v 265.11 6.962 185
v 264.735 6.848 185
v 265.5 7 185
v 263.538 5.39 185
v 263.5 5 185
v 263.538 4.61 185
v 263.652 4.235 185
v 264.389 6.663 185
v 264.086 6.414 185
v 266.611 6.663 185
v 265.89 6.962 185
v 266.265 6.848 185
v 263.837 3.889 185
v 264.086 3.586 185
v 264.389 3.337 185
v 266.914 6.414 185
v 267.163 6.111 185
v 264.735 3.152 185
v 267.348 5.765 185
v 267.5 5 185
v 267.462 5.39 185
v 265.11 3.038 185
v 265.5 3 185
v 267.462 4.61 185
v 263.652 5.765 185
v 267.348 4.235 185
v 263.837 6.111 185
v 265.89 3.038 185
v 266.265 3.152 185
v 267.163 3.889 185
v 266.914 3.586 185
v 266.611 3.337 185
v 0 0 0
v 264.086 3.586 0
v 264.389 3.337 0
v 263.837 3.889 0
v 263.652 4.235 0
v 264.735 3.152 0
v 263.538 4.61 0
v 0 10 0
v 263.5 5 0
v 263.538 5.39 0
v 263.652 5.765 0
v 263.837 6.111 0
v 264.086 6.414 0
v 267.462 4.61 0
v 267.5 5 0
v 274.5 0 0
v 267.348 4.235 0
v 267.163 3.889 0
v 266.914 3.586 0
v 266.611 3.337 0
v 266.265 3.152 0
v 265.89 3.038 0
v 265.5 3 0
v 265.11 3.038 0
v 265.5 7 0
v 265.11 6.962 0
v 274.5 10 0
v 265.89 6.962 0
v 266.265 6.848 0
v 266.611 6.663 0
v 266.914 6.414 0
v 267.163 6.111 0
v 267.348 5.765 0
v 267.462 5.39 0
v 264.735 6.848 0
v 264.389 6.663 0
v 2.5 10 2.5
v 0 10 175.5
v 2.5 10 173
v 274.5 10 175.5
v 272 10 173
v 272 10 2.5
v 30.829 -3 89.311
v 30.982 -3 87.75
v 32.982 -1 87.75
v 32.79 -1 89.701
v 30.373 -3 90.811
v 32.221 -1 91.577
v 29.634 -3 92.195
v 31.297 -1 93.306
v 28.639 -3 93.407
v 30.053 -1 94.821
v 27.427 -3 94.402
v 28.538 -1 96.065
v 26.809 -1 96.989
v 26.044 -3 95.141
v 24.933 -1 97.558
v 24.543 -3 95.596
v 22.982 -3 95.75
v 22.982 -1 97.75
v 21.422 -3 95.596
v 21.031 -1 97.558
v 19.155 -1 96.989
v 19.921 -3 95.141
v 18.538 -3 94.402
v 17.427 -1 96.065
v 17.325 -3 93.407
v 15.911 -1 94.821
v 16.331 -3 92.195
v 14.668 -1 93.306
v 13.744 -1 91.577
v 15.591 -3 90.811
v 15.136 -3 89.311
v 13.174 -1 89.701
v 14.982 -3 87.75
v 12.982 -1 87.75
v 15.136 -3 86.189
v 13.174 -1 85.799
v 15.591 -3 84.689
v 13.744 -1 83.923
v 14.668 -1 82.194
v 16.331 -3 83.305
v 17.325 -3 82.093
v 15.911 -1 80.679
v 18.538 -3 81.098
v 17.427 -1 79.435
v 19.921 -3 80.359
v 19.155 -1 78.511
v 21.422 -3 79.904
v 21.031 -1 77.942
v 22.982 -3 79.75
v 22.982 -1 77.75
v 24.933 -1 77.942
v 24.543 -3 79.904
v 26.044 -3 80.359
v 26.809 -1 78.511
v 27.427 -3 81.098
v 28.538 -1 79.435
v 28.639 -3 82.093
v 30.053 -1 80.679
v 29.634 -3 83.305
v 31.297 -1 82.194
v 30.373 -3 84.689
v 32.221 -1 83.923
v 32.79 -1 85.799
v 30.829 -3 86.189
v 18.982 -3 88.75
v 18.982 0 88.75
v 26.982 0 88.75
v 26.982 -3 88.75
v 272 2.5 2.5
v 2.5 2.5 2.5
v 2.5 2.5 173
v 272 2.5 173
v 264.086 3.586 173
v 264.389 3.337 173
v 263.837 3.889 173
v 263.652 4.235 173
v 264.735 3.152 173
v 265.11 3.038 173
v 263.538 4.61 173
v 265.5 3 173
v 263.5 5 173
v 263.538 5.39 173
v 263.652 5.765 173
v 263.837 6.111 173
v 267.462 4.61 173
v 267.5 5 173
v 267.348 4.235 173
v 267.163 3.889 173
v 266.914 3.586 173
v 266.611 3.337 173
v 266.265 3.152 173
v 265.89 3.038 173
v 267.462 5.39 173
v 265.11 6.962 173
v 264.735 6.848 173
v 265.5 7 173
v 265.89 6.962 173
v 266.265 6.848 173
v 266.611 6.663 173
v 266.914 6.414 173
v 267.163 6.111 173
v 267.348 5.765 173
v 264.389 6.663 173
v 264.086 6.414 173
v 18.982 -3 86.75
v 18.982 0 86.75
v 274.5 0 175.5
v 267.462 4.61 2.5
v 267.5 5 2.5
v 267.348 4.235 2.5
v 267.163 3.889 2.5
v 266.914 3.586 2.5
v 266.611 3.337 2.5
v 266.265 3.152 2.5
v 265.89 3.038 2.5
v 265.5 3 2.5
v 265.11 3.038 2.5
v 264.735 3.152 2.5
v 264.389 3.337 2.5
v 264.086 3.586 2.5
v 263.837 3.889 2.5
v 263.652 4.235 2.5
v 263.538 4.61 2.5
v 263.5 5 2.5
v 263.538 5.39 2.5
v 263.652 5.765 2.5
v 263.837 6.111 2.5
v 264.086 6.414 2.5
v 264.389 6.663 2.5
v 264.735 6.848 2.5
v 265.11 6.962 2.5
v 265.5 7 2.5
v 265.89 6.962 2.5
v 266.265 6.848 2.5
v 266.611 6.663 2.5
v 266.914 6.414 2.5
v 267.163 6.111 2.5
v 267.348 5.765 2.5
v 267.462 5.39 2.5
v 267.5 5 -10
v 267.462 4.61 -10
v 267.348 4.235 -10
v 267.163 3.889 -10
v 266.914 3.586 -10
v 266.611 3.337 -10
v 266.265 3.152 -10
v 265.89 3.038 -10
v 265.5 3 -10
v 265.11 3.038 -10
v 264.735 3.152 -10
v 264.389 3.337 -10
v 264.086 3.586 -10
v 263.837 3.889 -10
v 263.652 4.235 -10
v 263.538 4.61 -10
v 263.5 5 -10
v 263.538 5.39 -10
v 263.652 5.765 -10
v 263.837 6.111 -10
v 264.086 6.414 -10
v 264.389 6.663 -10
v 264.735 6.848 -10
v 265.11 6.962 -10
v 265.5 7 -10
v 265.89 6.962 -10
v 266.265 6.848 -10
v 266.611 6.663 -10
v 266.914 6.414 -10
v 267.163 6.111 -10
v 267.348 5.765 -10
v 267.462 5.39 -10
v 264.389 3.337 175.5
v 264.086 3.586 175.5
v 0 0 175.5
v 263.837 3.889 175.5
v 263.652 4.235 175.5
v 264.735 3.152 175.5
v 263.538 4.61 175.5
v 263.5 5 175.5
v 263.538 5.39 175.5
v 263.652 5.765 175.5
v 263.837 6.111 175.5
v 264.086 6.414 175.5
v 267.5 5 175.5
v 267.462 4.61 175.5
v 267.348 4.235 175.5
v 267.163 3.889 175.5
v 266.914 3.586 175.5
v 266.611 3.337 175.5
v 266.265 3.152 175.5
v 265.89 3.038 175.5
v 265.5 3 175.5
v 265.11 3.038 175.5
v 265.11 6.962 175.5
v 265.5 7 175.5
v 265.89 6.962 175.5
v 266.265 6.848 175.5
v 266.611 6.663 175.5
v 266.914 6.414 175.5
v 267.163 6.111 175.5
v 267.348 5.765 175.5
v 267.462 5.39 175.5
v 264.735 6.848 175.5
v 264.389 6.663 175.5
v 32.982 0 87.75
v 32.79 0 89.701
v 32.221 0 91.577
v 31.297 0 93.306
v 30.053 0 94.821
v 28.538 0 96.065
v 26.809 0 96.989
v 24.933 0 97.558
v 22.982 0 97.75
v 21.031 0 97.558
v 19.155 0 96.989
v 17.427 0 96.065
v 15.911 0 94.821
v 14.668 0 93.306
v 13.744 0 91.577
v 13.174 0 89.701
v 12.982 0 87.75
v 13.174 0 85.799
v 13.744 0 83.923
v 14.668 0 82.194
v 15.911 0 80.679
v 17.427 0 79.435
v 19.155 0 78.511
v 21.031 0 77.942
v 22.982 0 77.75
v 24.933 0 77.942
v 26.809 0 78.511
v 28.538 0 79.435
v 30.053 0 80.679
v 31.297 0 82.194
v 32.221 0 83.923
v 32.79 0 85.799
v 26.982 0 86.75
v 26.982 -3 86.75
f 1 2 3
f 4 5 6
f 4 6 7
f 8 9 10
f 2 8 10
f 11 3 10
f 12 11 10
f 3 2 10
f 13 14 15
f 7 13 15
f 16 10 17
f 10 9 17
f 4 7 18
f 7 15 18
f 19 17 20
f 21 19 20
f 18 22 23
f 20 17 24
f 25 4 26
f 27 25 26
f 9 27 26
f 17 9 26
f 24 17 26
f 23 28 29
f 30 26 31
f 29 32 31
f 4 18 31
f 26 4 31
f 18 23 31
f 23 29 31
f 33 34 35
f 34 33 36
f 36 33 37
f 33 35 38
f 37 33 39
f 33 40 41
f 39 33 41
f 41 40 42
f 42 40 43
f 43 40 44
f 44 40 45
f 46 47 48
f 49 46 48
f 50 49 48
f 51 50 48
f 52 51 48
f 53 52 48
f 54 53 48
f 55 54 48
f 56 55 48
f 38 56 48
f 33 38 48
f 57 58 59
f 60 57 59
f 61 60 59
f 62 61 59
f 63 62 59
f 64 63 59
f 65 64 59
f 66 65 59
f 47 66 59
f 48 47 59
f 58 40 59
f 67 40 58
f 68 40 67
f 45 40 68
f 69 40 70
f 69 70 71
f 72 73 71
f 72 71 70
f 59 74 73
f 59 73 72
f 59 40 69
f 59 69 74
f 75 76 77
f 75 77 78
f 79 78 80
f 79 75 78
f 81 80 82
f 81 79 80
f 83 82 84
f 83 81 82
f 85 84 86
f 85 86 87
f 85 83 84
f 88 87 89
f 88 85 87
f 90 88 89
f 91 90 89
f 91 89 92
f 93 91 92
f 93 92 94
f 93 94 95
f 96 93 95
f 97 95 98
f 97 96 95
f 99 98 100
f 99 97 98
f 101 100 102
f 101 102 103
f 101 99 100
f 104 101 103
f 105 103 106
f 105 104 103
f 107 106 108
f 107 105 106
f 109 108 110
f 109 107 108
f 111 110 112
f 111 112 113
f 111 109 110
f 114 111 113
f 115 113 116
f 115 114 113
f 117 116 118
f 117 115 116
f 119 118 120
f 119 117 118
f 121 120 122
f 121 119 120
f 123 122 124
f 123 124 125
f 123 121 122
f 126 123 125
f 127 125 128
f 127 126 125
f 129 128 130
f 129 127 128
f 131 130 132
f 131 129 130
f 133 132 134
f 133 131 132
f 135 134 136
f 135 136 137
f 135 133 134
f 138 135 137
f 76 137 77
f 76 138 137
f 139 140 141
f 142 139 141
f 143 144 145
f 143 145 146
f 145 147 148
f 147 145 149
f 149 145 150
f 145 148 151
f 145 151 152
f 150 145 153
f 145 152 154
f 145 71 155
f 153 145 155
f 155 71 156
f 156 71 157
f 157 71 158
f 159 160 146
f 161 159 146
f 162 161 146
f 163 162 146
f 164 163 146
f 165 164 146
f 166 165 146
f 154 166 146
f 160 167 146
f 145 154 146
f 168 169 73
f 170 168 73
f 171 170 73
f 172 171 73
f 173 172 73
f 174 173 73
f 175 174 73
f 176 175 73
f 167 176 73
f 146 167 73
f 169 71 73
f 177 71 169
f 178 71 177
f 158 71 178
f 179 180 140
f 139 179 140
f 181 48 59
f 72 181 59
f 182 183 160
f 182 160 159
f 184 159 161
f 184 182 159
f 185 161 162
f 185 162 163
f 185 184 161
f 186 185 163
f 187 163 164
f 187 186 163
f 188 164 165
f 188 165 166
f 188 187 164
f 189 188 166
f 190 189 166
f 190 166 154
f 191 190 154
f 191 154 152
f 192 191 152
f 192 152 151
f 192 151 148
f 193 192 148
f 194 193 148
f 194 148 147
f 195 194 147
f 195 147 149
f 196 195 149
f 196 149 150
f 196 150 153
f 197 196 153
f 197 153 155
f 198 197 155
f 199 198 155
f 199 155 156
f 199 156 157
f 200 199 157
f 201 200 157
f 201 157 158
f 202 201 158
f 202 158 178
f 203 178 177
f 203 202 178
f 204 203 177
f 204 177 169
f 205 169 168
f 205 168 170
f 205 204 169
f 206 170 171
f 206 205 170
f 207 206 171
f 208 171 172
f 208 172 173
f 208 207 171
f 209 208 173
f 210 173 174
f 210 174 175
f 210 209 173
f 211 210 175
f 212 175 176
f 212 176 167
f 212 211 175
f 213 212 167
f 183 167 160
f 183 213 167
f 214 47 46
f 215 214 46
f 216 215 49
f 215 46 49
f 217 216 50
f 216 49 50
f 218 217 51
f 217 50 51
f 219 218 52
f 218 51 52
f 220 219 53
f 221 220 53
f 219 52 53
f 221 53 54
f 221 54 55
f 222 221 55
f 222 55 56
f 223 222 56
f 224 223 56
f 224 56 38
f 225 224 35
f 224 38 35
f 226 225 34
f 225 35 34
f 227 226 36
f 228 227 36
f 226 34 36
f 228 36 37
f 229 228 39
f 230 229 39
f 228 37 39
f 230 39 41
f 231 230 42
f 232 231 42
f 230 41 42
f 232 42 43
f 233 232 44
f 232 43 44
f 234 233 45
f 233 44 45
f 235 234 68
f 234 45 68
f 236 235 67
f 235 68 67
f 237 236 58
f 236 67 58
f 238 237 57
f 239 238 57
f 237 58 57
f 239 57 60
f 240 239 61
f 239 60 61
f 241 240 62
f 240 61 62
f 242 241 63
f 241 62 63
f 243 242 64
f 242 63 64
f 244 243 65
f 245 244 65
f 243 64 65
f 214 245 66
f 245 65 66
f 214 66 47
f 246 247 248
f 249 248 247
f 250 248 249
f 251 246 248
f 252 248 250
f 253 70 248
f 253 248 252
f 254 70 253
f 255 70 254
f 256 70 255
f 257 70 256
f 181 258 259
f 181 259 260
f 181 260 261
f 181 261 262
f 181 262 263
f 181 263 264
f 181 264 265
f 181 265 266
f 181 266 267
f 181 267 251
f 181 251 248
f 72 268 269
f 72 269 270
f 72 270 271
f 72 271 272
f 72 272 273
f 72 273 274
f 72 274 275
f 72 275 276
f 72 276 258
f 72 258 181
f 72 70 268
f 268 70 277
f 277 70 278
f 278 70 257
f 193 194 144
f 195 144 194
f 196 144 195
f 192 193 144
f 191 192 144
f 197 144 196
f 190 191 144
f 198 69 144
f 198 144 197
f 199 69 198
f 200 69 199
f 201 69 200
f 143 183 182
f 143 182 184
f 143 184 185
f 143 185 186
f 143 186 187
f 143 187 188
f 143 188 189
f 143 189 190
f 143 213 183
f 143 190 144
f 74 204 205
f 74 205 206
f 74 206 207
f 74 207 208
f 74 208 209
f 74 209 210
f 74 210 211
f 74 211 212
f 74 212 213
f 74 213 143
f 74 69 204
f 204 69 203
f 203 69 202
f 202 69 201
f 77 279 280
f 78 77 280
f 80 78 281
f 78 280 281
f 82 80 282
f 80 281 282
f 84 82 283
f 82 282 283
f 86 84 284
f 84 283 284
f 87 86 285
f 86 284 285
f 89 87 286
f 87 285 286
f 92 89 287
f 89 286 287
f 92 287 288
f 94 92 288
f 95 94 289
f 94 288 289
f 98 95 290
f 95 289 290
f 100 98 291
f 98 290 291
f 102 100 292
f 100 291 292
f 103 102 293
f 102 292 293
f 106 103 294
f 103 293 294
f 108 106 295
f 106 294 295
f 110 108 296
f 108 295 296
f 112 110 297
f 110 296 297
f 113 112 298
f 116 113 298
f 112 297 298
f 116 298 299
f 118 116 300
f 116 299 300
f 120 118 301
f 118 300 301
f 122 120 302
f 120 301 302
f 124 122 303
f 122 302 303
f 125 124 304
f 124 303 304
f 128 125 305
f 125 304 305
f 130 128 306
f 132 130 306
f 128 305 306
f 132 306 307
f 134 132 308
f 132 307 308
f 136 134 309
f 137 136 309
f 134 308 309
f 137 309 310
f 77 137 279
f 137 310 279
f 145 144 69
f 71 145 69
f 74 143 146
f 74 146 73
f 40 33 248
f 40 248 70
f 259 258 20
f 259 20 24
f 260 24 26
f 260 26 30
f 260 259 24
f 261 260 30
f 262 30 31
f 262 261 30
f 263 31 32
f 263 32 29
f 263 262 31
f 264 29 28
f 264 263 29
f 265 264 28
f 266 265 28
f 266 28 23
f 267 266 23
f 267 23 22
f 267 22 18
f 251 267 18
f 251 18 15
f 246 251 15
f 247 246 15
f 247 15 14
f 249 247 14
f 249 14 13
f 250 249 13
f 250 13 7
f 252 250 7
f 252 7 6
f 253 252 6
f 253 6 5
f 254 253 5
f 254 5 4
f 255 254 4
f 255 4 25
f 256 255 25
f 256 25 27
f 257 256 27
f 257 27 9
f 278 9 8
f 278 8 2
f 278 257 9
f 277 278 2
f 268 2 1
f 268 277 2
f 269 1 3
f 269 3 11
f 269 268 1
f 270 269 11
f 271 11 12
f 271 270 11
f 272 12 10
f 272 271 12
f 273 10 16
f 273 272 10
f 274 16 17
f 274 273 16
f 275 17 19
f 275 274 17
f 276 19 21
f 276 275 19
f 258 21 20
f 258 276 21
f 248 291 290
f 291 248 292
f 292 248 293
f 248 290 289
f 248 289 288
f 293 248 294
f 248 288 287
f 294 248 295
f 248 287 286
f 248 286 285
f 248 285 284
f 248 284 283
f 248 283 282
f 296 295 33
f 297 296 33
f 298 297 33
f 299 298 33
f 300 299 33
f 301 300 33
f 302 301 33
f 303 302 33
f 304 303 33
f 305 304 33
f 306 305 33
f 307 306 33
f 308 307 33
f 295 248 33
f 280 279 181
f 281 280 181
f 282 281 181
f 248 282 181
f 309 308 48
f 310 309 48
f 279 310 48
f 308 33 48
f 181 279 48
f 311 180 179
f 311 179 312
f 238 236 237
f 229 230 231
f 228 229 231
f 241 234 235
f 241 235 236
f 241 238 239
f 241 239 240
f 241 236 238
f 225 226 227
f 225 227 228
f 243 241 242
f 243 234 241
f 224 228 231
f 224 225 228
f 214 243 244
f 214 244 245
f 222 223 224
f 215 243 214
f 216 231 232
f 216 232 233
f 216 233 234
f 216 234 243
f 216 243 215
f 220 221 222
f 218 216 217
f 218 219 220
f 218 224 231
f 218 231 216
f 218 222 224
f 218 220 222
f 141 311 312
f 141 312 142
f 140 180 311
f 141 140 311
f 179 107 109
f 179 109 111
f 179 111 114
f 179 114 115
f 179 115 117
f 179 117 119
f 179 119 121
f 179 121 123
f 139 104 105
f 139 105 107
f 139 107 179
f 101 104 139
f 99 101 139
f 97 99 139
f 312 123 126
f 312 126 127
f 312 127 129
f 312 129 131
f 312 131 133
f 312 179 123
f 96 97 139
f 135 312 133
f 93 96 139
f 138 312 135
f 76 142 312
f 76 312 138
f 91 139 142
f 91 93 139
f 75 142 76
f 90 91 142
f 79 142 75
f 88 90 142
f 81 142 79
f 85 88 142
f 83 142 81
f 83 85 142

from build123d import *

# Parameters (mm, degrees)
F0_W          = 274.5
F0_H          = 10
F1_DEPTH      = 175.5
F2_T          = -2.5
F3_R          = 2
F4_DEPTH      = 10
F4_DEPTH_BACK = 185
F5_R          = 10
F5_W          = 8
F5_H          = 2
F6_DEPTH      = 3
F7_SIZE       = 2


with BuildPart() as f1:
    # F0 (on Top) → F1 (new body)
    with BuildSketch(Plane.XY):
        with Locations((137.25, 5)):
            Rectangle(F0_W, F0_H)
    extrude(amount=F1_DEPTH)

    # F2
    f2_openings = [f1.faces().sort_by_distance(p)[0] for p in [
        (137.25, 10, 87.75),
    ]]
    offset(amount=F2_T, openings=f2_openings)

    # F3 (on face) → F4 (join, two sides)
    with BuildSketch(Plane(origin=(0, 0, 0), x_dir=(1, 0, 0), z_dir=(0, 0, -1))) as f4_sk:
        with Locations((265.5, -5)):
            Circle(F3_R)
    extrude(amount=F4_DEPTH)
    extrude(f4_sk.sketch, amount=-F4_DEPTH_BACK)

    # F5 (on face) → F6 (join)
    with BuildSketch(Plane.XZ):
        with Locations((22.982316, 87.75)):
            Circle(F5_R)
        with Locations((22.982316, 87.75)):
            Rectangle(F5_W, F5_H, mode=Mode.SUBTRACT)
    extrude(amount=F6_DEPTH)

    # F7
    f7_edges = [f1.edges().sort_by_distance(p)[0] for p in [
        (12.982316, -3, 87.75),
    ]]
    chamfer(f7_edges, length=F7_SIZE)


solid = f1.part
